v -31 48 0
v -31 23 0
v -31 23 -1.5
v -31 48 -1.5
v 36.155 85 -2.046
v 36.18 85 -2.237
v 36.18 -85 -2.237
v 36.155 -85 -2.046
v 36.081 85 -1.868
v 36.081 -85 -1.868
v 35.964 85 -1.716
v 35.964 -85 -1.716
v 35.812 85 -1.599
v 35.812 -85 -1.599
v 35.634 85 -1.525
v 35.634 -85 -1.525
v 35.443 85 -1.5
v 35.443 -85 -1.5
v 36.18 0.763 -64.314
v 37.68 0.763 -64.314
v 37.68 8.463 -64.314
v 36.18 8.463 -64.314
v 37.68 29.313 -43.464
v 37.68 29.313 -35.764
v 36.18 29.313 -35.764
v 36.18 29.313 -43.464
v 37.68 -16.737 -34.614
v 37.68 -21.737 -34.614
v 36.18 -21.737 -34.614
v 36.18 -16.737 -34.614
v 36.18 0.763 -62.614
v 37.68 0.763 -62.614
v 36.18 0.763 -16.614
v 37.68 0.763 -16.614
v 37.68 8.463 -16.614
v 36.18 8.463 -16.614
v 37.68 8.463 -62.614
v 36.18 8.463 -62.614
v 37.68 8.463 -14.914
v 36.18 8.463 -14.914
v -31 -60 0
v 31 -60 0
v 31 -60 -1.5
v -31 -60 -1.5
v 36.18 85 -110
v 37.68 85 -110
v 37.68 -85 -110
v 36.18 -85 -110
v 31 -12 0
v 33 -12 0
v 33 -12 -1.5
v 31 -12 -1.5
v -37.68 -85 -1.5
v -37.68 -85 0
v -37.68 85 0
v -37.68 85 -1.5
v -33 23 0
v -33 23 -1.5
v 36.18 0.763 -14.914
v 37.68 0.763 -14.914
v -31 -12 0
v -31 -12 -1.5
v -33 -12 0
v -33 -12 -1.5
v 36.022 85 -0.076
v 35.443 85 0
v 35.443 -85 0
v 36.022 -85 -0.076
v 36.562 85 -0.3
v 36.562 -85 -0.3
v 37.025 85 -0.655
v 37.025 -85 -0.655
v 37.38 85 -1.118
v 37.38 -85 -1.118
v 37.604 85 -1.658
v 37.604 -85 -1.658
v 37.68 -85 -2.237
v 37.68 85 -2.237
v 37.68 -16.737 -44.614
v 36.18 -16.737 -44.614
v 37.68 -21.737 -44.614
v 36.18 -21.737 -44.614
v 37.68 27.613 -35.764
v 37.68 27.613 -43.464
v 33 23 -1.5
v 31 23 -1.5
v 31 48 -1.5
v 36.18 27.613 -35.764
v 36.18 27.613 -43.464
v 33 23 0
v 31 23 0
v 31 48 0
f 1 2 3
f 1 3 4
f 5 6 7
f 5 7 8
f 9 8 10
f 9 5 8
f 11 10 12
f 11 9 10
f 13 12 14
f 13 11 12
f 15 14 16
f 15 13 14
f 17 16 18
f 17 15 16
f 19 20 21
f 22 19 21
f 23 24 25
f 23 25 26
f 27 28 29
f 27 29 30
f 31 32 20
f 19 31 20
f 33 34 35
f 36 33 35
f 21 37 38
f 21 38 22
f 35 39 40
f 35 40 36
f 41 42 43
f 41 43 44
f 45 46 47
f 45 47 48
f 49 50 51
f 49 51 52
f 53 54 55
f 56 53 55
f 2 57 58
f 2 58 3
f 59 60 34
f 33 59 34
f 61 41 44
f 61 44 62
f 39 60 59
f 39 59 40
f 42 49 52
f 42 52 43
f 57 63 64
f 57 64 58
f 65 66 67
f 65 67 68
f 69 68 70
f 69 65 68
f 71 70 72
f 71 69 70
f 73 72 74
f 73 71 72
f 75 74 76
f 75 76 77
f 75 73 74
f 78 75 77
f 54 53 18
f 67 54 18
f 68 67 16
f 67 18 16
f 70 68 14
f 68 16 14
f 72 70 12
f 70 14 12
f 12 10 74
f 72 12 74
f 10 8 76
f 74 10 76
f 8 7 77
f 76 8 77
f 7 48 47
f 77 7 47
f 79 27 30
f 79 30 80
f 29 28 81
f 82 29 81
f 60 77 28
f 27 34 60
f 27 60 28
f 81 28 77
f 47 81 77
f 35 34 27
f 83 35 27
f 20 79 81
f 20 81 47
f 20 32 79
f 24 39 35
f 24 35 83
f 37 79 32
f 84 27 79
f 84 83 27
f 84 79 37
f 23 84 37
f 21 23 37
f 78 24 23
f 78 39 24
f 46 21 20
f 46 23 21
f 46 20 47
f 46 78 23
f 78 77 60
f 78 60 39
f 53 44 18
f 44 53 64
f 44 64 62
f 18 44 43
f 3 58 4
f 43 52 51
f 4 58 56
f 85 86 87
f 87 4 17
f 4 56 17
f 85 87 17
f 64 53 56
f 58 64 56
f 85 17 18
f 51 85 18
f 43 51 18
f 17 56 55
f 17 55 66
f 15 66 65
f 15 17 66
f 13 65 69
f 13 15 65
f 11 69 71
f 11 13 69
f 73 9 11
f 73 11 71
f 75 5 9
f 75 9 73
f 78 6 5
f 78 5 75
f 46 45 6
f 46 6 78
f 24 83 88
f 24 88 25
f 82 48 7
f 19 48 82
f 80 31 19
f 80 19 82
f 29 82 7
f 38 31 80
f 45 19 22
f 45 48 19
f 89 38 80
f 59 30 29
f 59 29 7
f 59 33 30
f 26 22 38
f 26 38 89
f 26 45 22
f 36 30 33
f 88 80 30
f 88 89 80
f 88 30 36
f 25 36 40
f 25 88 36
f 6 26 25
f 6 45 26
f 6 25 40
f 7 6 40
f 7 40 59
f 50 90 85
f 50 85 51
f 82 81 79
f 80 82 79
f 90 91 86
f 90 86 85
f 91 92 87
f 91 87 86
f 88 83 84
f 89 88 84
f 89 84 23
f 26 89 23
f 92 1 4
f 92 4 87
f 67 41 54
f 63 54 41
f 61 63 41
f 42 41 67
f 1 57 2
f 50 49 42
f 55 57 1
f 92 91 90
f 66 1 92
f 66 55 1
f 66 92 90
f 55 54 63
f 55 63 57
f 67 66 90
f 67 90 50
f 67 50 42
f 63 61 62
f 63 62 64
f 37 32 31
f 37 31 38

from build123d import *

# Parameters (mm, degrees)
SKETCH1_W                    = 75.36
SKETCH1_H                    = 170
BASE_FLANGE1_DEPTH           = 1.5
EDGE_FLANGE1_STRIP_W         = 7.4732
EDGE_FLANGE1_STRIP_H         = 1.5
EDGE_FLANGE1_STRIP_CUT_DEPTH = 170
EDGE_FLANGE1_DEPTH           = 170
SKETCH11_W                   = 1.7
SKETCH11_H                   = 7.7
SKETCH11_W_2                 = 7.7
SKETCH11_H_2                 = 1.7
SKETCH11_W_3                 = 10
SKETCH11_H_3                 = 5
CUT_EXTRUDE2_DEPTH           = 2


# Sheet-metal steps are written as plain solids
with BuildPart() as part:
    # Sketch1 → Base-Flange1 (new body)
    with BuildSketch(Plane.XY):
        Rectangle(SKETCH1_W, SKETCH1_H)
        Polygon((-31, 23), (-31, 48), (31, 48), (31, 23), (33, 23), (33, -12), (31, -12), (31, -60), (-31, -60), (-31, -12), (-33, -12), (-33, 23), align=None, mode=Mode.SUBTRACT)
    extrude(amount=-BASE_FLANGE1_DEPTH)

    # Edge-Flange1 strip (across the edge) → Edge-Flange1 strip cut (cut)
    with BuildSketch(Plane(origin=(37.68, 85, -1.5), x_dir=(-1, 0, 0), z_dir=(0, -1, 0))):
        with Locations((-1.5, -0.75)):
            Rectangle(EDGE_FLANGE1_STRIP_W, EDGE_FLANGE1_STRIP_H)
    extrude(amount=EDGE_FLANGE1_STRIP_CUT_DEPTH, mode=Mode.SUBTRACT)

    # Edge-Flange1 section (across the edge) → Edge-Flange1 (add)
    with BuildSketch(Plane(origin=(37.68, 85, -1.5), x_dir=(-1, 0, 0), z_dir=(0, -1, 0))):
        with BuildLine():
            Line((0, 0.7366), (0, 108.5))
            Line((0, 108.5), (1.5, 108.5))
            Line((1.5, 108.5), (1.5, 0.7366))
            ThreePointArc((1.5, 0.7366), (1.715745145, 0.215745145), (2.2366, 0))
            Line((2.2366, 0), (2.2366, -1.5))
            ThreePointArc((2.2366, -1.5), (0.655084973, -0.844915027), (0, 0.7366))
        make_face()
    extrude(amount=EDGE_FLANGE1_DEPTH)

    # Sketch11 → Cut-Extrude2 (cut)
    with BuildSketch(Plane(origin=(37.68, 0, 0), x_dir=(0, 0, -1), z_dir=(1, 0, 0))):
        with Locations((63.463831766, 4.61334704)):
            Rectangle(SKETCH11_W, SKETCH11_H)
        with Locations((39.613831766, 28.46334704)):
            Rectangle(SKETCH11_W_2, SKETCH11_H_2)
        with Locations((15.763831766, 4.61334704)):
            Rectangle(SKETCH11_W, SKETCH11_H)
        with Locations((39.613831766, -19.23665296)):
            Rectangle(SKETCH11_W_3, SKETCH11_H_3)
    extrude(amount=-CUT_EXTRUDE2_DEPTH, mode=Mode.SUBTRACT)


solid = part.part
